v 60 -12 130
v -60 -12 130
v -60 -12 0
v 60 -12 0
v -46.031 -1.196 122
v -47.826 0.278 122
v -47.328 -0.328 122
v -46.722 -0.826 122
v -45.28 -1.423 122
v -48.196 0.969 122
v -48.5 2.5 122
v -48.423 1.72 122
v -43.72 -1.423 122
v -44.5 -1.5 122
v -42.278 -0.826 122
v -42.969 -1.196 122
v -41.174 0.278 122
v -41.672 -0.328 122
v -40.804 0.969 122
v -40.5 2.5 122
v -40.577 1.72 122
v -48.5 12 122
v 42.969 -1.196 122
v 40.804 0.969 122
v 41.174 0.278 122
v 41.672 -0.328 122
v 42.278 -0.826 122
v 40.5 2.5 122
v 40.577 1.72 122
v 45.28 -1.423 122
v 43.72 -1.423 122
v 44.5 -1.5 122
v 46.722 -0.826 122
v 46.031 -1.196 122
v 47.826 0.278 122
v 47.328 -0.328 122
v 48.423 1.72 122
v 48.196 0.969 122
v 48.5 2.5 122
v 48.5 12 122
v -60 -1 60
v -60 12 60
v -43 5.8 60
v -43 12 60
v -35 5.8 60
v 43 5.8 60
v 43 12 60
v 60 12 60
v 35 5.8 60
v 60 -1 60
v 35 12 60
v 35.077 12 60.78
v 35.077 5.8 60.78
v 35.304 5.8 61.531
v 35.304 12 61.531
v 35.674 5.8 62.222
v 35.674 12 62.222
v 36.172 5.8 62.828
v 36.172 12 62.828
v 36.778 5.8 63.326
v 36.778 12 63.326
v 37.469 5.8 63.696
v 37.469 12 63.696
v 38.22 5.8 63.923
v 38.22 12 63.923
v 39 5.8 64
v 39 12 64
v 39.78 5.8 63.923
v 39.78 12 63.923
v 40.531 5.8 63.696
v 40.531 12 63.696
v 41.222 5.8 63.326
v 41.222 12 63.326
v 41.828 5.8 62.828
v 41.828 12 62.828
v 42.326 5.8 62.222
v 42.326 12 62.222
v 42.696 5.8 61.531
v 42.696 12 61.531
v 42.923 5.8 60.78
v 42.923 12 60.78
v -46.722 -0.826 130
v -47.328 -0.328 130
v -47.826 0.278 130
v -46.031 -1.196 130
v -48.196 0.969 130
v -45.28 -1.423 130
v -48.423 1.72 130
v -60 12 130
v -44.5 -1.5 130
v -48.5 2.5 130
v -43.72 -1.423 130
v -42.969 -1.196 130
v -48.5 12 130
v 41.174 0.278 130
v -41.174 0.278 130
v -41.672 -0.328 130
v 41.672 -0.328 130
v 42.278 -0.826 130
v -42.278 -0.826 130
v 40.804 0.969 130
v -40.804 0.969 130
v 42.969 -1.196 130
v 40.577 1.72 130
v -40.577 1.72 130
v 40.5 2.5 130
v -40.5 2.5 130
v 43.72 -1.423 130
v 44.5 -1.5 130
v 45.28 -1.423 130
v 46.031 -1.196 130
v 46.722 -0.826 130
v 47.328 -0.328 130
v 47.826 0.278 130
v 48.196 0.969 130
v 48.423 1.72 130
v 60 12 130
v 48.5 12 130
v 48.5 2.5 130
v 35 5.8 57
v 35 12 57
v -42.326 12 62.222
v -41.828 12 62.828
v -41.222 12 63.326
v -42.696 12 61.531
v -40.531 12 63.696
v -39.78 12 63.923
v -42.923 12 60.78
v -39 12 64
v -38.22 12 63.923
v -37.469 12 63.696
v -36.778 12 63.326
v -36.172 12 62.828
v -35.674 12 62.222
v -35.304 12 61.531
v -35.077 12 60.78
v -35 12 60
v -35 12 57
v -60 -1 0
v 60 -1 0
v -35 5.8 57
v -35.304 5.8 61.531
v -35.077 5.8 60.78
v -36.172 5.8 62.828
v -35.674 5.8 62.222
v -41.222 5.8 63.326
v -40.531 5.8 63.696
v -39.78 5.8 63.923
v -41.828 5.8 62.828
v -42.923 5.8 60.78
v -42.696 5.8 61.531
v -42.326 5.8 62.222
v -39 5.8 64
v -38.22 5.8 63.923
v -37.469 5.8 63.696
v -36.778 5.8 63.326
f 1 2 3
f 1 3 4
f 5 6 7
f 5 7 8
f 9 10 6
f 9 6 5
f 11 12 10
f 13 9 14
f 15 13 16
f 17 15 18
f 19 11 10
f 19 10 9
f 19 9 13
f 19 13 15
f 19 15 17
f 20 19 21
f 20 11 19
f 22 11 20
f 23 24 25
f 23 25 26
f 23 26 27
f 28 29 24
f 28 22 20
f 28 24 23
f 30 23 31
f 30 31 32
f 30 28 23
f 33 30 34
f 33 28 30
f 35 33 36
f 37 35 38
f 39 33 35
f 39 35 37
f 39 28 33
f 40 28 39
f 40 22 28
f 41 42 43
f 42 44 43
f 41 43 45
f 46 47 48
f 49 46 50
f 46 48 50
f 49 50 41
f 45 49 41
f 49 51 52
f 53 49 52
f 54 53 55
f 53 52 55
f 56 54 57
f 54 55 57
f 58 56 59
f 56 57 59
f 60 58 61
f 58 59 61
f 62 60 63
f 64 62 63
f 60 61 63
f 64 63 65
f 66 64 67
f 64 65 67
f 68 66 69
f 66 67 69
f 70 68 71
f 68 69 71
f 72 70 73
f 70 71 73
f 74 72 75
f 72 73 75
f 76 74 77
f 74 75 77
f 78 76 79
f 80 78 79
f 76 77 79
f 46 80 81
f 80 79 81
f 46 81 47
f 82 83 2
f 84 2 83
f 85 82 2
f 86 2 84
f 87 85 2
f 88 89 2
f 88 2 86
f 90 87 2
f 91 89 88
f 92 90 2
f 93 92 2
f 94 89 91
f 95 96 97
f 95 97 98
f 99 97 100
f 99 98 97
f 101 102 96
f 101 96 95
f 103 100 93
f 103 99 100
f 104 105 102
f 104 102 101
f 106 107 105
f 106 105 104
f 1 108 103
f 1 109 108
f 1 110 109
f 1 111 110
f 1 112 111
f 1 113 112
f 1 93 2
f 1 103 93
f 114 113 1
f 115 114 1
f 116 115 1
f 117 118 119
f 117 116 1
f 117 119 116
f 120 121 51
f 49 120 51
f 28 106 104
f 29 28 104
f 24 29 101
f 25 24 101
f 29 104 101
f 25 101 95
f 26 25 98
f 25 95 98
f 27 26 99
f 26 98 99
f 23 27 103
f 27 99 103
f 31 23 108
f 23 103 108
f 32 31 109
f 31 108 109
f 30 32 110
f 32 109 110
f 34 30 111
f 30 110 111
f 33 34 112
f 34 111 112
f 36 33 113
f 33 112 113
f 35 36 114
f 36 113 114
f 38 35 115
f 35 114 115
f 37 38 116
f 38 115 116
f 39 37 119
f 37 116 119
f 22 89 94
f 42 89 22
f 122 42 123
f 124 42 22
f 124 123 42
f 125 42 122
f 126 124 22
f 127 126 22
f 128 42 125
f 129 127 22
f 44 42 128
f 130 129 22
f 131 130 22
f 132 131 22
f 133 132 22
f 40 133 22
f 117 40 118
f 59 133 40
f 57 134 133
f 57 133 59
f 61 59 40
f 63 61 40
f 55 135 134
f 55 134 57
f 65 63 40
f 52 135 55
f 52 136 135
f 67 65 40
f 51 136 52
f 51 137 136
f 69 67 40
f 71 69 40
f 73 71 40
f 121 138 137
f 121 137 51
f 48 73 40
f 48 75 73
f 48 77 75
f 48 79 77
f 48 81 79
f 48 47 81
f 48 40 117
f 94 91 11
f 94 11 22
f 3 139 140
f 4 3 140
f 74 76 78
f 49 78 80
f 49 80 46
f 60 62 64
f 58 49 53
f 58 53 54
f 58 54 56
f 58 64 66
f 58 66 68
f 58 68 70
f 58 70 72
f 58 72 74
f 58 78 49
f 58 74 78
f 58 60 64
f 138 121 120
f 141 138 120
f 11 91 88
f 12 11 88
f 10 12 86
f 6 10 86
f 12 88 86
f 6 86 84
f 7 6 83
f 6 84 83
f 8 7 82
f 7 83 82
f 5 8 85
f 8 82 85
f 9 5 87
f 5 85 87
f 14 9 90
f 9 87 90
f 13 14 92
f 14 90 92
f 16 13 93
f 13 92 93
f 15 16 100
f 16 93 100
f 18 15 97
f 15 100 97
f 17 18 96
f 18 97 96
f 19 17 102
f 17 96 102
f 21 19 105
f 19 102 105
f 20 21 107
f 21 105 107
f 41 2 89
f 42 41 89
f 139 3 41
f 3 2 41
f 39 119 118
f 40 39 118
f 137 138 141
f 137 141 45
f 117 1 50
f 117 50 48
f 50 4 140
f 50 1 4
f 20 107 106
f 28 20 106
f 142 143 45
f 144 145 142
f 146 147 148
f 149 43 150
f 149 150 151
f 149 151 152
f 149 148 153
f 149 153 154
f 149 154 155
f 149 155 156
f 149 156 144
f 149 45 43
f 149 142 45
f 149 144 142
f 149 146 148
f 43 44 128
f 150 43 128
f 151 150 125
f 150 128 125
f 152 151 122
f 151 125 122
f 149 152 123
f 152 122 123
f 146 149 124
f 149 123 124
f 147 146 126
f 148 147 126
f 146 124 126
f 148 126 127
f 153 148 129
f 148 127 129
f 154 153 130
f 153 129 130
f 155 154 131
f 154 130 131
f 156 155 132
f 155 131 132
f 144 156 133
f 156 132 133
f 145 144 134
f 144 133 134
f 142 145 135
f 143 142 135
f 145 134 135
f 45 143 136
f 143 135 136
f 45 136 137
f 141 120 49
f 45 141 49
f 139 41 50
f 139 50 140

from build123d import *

# Parameters (mm, degrees)
F0_W      = 120
F0_H      = 24
F1_DEPTH  = 130
F2_W      = 97
F2_H      = 9.5
F3_DEPTH  = 8
F5_DEPTH  = 8
F7_DEPTH  = 120.001
F8_W      = 25
F8_H      = 3
F9_DEPTH  = 13
F11_DEPTH = 6.2


with BuildPart() as f1:
    # F0 (on Top) → F1 (new body)
    with BuildSketch(Plane.XY):
        Rectangle(F0_W, F0_H)
    extrude(amount=F1_DEPTH)

    # F2 (on face) → F3 (cut)
    with BuildSketch(Plane.XY.offset(130)):
        with Locations((0, 7.25)):
            Rectangle(F2_W, F2_H)
    extrude(amount=-F3_DEPTH, mode=Mode.SUBTRACT)

    # F4 (on face) → F5 (cut, through all)
    with BuildSketch(Plane.XY.offset(130)):
        with BuildLine():
            Line((-40.5, 2.5), (-48.5, 2.5))
            ThreePointArc((-48.5, 2.5), (-44.5, -1.5), (-40.5, 2.5))
        make_face()
        with BuildLine():
            ThreePointArc((40.5, 2.5), (44.5, -1.5), (48.5, 2.5))
            Line((48.5, 2.5), (40.5, 2.5))
        make_face()
    extrude(amount=-F5_DEPTH, mode=Mode.SUBTRACT)

    # F6 (on face) → F7 (cut, through all)
    with BuildSketch(Plane.YZ.offset(60)):
        Polygon((-1, 0), (12, 0), (12, 57), (5.8, 57), (5.8, 60), (-1, 60), align=None)
    extrude(amount=-F7_DEPTH, mode=Mode.SUBTRACT)

    # F8 (on face) → F9 (cut, through all)
    with BuildSketch(Plane(origin=(0, 12, 0), x_dir=(-1, 0, 0), z_dir=(0, 1, 0))):
        with Locations((-47.5, 58.5)):
            Rectangle(F8_W, F8_H)
        with Locations((47.5, 58.5)):
            Rectangle(F8_W, F8_H)
    extrude(amount=-F9_DEPTH, mode=Mode.SUBTRACT)

    # F10 (on face) → F11 (cut, through all)
    with BuildSketch(Plane(origin=(0, 12, 0), x_dir=(-1, 0, 0), z_dir=(0, 1, 0))):
        with BuildLine():
            Line((-43, 60), (-35, 60))
            ThreePointArc((-35, 60), (-39, 64), (-43, 60))
        make_face()
        with BuildLine():
            ThreePointArc((43, 60), (39, 64), (35, 60))
            Line((35, 60), (43, 60))
        make_face()
    extrude(amount=-F11_DEPTH, mode=Mode.SUBTRACT)


solid = f1.part
